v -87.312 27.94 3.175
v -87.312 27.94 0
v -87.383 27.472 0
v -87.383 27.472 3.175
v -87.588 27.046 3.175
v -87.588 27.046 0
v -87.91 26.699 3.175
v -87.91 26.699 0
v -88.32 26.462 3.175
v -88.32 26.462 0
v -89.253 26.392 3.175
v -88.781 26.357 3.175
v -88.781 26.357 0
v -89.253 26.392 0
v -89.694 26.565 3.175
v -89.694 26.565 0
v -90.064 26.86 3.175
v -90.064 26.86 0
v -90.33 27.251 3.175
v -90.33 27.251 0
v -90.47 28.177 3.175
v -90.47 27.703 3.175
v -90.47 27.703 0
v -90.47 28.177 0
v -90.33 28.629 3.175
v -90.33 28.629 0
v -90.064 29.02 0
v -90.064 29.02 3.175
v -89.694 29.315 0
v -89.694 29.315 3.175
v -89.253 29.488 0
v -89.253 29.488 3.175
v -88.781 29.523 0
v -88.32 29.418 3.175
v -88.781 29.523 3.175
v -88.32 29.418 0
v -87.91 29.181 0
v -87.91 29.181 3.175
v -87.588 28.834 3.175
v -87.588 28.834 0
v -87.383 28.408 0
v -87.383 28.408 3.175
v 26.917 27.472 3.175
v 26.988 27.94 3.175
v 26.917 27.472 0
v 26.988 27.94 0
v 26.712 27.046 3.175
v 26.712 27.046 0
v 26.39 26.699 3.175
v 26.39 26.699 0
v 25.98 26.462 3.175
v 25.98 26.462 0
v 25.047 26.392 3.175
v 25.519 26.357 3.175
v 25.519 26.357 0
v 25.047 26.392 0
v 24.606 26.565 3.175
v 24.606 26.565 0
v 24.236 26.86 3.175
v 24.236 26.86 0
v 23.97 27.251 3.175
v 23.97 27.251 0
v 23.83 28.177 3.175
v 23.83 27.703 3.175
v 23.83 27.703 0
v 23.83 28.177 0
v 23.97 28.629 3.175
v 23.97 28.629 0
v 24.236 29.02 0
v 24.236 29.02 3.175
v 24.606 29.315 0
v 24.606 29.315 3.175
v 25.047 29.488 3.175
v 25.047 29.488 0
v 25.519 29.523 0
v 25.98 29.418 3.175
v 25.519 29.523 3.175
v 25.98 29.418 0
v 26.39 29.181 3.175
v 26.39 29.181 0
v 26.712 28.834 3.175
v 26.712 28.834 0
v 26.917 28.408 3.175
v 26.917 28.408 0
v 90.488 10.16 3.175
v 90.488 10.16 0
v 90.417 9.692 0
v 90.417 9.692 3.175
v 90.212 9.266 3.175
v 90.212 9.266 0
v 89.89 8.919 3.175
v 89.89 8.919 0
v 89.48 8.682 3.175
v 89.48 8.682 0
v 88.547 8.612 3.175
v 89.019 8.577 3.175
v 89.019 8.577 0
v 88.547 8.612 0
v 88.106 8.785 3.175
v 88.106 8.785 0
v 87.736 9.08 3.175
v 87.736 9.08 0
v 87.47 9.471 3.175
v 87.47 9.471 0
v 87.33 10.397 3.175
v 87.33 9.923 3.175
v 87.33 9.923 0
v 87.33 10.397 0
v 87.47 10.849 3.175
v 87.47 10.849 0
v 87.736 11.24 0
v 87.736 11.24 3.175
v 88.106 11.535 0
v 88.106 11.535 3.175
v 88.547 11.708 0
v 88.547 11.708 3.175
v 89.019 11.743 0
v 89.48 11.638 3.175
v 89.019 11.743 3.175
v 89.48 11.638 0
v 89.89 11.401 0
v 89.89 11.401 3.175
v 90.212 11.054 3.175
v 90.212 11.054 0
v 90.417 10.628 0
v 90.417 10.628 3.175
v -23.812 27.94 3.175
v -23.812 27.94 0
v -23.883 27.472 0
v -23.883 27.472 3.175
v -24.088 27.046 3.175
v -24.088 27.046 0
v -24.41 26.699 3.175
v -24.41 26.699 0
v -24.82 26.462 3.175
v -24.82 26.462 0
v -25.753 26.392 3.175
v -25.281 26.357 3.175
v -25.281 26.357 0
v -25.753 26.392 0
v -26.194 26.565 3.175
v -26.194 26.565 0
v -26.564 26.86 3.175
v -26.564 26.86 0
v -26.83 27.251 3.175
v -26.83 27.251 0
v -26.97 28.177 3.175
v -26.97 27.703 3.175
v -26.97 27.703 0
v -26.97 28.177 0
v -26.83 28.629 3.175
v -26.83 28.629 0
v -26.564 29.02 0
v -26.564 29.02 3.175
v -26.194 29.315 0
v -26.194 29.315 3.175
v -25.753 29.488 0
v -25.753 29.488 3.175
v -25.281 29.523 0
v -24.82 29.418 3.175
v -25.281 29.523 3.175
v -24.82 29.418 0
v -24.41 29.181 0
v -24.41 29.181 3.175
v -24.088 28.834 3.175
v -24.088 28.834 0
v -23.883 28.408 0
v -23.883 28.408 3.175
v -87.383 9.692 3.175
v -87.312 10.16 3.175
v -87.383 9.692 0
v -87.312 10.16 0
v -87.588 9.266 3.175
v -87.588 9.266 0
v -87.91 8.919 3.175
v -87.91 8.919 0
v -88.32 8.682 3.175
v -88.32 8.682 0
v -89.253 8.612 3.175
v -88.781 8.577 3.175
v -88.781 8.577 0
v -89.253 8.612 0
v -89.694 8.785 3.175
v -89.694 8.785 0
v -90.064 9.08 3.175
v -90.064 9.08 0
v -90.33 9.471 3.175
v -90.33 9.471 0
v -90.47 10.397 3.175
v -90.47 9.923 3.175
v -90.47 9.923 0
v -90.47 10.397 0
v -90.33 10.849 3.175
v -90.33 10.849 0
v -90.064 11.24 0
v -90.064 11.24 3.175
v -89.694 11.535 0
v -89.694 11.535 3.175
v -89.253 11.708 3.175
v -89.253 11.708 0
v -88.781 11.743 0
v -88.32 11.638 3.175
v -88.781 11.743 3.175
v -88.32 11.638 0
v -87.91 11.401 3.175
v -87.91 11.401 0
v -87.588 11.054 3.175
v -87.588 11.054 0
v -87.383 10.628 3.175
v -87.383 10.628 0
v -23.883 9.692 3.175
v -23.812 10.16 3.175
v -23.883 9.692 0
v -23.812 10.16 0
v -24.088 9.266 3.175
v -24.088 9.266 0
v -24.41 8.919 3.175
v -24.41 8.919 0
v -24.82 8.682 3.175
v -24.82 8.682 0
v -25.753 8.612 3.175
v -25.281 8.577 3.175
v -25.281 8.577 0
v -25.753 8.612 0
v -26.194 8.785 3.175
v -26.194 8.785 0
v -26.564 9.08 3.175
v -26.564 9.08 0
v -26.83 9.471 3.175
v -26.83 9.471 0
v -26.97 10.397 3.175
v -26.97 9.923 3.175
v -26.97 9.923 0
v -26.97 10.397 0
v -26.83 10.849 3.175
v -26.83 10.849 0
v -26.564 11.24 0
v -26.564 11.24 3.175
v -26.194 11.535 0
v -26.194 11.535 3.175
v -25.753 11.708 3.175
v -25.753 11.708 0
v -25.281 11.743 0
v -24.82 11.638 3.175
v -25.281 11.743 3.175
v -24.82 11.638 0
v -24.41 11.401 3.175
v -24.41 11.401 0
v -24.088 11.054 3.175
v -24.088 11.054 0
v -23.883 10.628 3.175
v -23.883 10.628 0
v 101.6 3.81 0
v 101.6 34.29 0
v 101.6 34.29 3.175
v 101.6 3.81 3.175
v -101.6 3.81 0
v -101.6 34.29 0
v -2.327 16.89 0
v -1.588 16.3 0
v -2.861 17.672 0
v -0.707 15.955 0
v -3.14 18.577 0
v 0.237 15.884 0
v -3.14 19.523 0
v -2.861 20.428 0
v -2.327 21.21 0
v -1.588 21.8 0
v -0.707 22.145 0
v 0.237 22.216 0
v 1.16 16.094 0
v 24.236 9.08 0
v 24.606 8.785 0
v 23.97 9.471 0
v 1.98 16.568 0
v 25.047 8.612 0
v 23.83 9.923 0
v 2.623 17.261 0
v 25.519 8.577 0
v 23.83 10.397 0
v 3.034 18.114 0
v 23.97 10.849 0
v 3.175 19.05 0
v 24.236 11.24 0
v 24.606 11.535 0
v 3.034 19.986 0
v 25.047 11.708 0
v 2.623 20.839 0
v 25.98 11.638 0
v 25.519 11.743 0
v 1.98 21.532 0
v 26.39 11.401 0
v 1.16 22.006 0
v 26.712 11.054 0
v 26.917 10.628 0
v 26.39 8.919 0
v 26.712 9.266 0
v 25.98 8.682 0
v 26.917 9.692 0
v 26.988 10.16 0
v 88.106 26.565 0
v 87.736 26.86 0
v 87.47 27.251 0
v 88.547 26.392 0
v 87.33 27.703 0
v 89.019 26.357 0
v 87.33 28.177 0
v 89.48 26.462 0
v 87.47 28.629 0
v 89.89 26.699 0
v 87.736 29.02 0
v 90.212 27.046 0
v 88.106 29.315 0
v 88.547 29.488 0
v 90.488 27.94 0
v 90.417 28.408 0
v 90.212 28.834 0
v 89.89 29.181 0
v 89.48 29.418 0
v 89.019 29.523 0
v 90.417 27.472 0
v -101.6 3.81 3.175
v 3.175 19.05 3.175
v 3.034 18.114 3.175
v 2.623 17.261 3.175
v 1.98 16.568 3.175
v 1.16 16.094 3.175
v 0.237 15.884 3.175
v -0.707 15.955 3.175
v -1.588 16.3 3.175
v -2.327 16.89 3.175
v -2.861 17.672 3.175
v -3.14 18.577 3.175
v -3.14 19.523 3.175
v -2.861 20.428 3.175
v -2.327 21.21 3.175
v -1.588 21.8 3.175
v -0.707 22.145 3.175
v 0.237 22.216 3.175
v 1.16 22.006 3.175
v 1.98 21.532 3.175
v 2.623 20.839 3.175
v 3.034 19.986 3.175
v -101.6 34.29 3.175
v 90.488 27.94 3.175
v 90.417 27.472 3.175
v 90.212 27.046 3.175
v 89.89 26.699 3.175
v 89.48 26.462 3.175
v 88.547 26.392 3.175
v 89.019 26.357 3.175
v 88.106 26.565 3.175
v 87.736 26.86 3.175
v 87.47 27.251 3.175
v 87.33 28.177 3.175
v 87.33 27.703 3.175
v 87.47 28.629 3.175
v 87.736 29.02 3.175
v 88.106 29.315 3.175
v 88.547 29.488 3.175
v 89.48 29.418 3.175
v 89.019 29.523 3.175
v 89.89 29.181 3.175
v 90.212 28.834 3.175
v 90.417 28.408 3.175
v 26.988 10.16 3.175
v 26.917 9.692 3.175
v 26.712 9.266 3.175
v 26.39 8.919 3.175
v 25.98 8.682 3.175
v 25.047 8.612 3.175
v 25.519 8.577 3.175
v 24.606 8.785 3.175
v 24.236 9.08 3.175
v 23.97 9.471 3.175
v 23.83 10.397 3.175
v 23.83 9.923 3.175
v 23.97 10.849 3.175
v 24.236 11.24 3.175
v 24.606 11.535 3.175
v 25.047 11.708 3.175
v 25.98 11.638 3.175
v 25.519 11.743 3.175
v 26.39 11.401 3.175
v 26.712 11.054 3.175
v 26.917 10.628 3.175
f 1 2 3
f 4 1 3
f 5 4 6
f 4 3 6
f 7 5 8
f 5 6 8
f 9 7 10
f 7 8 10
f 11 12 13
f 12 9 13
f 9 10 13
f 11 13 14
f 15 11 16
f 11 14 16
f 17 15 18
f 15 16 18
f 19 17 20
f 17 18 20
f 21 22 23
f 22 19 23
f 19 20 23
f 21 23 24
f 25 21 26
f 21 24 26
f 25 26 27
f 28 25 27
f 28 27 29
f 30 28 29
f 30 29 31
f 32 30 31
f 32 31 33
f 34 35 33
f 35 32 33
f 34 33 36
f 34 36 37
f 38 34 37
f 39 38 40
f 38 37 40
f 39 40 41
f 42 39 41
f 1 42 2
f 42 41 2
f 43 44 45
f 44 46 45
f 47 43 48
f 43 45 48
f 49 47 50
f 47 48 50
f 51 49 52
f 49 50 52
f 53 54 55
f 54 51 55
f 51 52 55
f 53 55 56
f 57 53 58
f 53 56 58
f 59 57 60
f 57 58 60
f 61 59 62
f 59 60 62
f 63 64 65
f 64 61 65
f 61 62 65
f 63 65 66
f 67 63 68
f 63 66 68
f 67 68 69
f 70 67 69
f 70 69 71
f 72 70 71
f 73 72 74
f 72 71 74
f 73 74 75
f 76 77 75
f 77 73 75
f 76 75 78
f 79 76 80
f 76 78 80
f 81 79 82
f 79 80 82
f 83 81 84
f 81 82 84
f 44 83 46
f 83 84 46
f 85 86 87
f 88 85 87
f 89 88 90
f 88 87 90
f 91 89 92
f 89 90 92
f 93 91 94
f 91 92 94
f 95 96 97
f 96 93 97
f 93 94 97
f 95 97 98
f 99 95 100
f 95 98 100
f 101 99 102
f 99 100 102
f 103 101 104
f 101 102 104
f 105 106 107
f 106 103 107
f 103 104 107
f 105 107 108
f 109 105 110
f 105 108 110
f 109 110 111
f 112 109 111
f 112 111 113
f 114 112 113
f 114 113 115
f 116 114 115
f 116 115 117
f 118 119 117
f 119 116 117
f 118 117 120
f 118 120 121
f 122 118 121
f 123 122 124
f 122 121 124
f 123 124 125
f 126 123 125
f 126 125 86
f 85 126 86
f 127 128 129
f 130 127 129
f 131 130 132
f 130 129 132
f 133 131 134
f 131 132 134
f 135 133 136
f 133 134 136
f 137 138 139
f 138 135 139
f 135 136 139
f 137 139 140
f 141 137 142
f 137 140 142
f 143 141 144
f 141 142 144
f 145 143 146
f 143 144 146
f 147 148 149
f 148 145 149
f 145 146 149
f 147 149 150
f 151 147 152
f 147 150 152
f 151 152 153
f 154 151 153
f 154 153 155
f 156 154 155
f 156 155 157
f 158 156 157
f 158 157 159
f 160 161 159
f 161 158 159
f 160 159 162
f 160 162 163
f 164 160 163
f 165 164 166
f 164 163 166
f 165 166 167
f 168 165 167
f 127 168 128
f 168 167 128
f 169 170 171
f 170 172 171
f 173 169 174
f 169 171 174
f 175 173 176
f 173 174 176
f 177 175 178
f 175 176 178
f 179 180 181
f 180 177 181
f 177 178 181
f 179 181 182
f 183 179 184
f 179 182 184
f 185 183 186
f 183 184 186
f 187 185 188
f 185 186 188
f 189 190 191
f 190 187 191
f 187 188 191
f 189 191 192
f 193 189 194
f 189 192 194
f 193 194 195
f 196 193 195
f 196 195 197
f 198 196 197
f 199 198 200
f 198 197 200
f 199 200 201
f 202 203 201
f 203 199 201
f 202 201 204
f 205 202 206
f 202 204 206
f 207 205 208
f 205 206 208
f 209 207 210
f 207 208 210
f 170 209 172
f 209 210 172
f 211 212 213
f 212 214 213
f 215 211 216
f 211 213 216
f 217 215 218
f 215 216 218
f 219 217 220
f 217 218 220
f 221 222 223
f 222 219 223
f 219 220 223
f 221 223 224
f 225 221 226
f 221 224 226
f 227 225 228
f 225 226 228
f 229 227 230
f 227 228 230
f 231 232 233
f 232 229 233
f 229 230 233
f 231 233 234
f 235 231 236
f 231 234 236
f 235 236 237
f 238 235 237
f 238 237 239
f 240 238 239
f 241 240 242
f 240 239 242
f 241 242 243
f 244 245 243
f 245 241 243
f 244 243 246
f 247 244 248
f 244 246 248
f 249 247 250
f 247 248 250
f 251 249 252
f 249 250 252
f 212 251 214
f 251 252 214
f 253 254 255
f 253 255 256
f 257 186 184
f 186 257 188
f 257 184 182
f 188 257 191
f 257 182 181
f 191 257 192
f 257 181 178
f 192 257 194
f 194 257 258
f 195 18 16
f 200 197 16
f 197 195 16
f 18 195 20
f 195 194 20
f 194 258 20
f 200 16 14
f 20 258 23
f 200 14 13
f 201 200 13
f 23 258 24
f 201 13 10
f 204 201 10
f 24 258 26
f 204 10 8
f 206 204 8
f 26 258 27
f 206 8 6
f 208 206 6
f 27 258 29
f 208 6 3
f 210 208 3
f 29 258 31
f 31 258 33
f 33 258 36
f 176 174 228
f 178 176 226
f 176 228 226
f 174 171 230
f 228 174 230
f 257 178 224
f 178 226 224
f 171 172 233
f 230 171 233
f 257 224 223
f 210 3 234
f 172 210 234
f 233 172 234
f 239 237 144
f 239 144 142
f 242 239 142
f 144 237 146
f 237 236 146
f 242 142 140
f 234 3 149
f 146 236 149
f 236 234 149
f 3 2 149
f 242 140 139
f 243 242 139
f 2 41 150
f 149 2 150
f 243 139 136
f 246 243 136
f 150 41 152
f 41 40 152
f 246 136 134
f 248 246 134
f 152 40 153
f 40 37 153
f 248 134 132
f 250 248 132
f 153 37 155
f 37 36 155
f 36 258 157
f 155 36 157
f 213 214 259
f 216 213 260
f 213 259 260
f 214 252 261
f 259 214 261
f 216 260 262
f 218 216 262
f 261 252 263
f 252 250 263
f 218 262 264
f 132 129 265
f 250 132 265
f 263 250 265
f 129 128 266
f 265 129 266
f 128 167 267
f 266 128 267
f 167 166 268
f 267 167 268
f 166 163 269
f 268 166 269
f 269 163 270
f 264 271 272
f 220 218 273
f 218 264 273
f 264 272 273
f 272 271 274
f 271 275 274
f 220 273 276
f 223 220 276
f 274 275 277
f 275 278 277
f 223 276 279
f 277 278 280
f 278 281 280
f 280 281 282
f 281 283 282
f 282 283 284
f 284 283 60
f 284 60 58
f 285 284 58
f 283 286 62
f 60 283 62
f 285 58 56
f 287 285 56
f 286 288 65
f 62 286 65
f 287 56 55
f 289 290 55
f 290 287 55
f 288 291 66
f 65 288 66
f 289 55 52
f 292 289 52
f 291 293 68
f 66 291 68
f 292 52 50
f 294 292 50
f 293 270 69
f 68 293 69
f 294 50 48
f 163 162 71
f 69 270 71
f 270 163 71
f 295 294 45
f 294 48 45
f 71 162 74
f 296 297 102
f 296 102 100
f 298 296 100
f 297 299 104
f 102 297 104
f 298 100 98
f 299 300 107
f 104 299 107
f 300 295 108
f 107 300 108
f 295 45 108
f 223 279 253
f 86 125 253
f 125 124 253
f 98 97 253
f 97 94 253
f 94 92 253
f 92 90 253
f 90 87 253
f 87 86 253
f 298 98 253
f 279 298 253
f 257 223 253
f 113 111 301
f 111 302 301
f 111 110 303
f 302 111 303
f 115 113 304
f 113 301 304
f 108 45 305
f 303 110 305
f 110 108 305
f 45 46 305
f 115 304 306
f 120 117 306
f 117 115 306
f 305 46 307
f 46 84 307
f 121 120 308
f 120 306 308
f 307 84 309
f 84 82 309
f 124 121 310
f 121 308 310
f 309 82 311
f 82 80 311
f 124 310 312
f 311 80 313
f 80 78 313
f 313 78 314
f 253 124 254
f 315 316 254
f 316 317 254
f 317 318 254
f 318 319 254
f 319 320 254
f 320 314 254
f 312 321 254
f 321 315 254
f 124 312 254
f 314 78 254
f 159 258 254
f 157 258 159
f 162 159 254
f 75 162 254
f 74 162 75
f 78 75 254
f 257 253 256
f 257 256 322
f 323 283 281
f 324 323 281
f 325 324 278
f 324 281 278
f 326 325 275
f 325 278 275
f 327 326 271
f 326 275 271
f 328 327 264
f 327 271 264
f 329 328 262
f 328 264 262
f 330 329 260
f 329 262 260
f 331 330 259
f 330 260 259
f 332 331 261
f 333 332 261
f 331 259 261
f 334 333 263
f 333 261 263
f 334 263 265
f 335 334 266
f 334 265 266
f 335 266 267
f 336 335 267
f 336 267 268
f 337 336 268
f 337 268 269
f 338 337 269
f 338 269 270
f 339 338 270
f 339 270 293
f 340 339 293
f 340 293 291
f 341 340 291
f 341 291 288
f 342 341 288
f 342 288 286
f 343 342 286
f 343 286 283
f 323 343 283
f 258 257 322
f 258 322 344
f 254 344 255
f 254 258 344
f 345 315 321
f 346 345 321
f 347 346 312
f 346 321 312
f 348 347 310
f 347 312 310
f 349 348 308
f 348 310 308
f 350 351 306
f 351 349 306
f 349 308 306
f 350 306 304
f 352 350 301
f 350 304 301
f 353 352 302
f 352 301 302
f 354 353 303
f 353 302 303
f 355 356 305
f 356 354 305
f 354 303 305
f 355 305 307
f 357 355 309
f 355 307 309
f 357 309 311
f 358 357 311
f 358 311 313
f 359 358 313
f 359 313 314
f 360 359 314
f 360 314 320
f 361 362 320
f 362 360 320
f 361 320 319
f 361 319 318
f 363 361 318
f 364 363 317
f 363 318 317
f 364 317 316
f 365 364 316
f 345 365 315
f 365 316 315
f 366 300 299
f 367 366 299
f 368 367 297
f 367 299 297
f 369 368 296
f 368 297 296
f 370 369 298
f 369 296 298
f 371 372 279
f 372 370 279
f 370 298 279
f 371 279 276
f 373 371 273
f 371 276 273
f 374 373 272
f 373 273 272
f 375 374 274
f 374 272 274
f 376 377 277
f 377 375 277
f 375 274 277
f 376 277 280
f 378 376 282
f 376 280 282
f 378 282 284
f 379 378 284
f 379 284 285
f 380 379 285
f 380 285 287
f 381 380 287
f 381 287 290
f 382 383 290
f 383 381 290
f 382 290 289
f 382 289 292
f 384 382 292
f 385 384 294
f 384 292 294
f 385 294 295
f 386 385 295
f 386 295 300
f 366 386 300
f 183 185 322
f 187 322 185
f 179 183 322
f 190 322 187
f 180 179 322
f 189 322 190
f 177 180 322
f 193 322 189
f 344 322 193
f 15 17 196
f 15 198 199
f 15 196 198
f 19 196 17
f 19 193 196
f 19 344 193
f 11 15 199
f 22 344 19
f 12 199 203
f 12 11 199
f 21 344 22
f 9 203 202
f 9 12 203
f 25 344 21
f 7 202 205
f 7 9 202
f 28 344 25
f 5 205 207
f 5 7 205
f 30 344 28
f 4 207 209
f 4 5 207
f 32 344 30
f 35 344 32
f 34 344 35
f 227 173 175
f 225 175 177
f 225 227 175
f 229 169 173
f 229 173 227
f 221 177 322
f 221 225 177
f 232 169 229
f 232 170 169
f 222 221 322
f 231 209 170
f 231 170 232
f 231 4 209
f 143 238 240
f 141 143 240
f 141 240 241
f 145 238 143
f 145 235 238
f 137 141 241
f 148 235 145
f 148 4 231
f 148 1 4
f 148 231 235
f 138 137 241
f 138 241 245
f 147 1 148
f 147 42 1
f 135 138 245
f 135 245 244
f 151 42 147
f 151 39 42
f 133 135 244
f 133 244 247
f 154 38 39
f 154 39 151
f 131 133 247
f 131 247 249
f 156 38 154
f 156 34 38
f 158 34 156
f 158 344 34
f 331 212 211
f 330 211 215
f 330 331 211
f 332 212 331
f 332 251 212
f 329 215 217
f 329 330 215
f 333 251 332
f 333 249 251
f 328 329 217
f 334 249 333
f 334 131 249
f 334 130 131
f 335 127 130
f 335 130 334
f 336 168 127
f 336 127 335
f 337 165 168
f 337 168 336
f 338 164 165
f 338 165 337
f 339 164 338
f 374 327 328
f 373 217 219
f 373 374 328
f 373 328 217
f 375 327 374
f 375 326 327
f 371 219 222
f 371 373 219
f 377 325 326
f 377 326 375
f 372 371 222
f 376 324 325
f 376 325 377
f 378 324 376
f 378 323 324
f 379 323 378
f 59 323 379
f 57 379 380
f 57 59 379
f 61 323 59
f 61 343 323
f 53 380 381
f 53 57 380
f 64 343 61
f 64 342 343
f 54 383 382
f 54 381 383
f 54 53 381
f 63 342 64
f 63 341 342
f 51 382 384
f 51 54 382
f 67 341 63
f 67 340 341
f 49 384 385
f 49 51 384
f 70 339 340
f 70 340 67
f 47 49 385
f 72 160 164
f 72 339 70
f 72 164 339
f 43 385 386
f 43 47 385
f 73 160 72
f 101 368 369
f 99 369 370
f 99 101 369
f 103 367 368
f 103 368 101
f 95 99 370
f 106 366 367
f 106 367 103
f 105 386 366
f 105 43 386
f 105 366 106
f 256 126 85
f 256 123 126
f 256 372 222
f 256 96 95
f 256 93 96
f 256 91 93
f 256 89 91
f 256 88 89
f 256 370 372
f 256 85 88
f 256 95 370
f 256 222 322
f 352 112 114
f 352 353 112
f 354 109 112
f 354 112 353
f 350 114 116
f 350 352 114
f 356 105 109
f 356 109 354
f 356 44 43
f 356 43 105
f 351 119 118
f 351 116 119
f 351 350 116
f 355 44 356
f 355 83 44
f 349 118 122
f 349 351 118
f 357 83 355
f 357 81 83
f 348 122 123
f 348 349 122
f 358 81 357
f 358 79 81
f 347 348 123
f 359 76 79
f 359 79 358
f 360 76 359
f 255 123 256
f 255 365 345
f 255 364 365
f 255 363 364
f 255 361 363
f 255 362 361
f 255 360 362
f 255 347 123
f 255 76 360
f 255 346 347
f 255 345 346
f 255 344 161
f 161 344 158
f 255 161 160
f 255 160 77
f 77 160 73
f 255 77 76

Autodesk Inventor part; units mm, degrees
ref_plane "YZ Plane" through (0, 0, 0) normal (1, 0, 0) x (0, 1, 0)
ref_plane "XZ Plane" through (0, 0, 0) normal (0, 1, 0) x (-1, 0, 0)
ref_plane "XY Plane" through (0, 0, 0) normal (0, 0, 1) x (1, 0, 0)
sketch "Sketch1" plane through (0, 0, 0) normal (0, 0, 1) x (1, 0, 0)
  line L0 (0, 0) -> (150, 0)
  line L1 (150, 0) -> (150, 38.1)
  line L2 (150, 38.1) -> (0, 38.1)
  line L3 (0, 38.1) -> (0, 0)
  line L4 (0, 0) -> (-549.9999, 0)
  line L5 (-549.9999, 0) -> (-549.9999, 38.1)
  line L6 (-549.9999, 38.1) -> (0, 38.1)
  line L7 (0, 38.1) -> (0, 0)
  circle A0 centre (0, 19.05) radius 3.175
  circle A1 centre (137.3, 19.05) radius 3.175
  circle A2 centre (-537.2999, 25.4) radius 3.175
  circle A3 centre (-499.1999, 12.7) radius 3.175
  line L8 (-101.6, 34.29) -> (101.6, 34.29)
  line L9 (101.6, 34.29) -> (101.6, 3.81)
  line L10 (101.6, 3.81) -> (-101.6, 3.81)
  line L11 (-101.6, 3.81) -> (-101.6, 34.29)
  circle A4 centre (-88.9, 27.94) radius 1.5875
  circle A5 centre (-88.9, 10.16) radius 1.5875
  circle A6 centre (-25.4, 10.16) radius 1.5875
  circle A7 centre (-25.4, 27.94) radius 1.5875
  circle A8 centre (25.4, 27.94) radius 1.5875
  circle A9 centre (25.4, 10.16) radius 1.5875
  circle A10 centre (88.9, 10.16) radius 1.5875
  circle A11 centre (88.9, 27.94) radius 1.5875
  point P0 (150, 19.05)
  point P1 (-101.6, 19.05)
  point P2 (0, 15.875)
  point P3 (0, 22.225)
  dimension "d0" = 150
  dimension "d1" = 38.1
  dimension "d2" = 38.1
  dimension "d3" = 549.9999
  dimension "d4" = 6.35
  dimension "d5" = 6.35
  dimension "d6" = 6.35
  dimension "d7" = 6.35
  dimension "d8" = 12.7
  dimension "d9" = 12.7
  dimension "d10" = 12.7
  dimension "d11" = 50.8
  dimension "d12" = 19.05
  dimension "d13" = 12.7
  dimension "d14" = 203.2
  dimension "d15" = 3.81
  dimension "d16" = 3.81
  dimension "d17" = 101.6
  dimension "d18" = 3.175
  dimension "d19" = 3.175
  dimension "d20" = 3.175
  dimension "d21" = 3.175
  dimension "d22" = 3.175
  dimension "d23" = 3.175
  dimension "d24" = 3.175
  dimension "d25" = 3.175
  dimension "d26" = 6.35
  dimension "d27" = 6.35
  dimension "d28" = 6.35
  dimension "d29" = 6.35
  dimension "d30" = 6.35
  dimension "d31" = 6.35
  dimension "d32" = 12.7
  dimension "d33" = 12.7
  dimension "d34" = 12.7
  dimension "d35" = 12.7
  dimension "d36" = 25.4
  dimension "d37" = 25.4
  dimension "d38" = 25.4
  dimension "d39" = 25.4
  dimension "d40" = 6.35
  dimension "d41" = 6.35
extrude "Extrusion1" add sketch "Sketch1" along normal blind 3.175 contours L10 L11 L8 L3 A0 | L3 A0 L8 L9 L10
properties part number "arm"
